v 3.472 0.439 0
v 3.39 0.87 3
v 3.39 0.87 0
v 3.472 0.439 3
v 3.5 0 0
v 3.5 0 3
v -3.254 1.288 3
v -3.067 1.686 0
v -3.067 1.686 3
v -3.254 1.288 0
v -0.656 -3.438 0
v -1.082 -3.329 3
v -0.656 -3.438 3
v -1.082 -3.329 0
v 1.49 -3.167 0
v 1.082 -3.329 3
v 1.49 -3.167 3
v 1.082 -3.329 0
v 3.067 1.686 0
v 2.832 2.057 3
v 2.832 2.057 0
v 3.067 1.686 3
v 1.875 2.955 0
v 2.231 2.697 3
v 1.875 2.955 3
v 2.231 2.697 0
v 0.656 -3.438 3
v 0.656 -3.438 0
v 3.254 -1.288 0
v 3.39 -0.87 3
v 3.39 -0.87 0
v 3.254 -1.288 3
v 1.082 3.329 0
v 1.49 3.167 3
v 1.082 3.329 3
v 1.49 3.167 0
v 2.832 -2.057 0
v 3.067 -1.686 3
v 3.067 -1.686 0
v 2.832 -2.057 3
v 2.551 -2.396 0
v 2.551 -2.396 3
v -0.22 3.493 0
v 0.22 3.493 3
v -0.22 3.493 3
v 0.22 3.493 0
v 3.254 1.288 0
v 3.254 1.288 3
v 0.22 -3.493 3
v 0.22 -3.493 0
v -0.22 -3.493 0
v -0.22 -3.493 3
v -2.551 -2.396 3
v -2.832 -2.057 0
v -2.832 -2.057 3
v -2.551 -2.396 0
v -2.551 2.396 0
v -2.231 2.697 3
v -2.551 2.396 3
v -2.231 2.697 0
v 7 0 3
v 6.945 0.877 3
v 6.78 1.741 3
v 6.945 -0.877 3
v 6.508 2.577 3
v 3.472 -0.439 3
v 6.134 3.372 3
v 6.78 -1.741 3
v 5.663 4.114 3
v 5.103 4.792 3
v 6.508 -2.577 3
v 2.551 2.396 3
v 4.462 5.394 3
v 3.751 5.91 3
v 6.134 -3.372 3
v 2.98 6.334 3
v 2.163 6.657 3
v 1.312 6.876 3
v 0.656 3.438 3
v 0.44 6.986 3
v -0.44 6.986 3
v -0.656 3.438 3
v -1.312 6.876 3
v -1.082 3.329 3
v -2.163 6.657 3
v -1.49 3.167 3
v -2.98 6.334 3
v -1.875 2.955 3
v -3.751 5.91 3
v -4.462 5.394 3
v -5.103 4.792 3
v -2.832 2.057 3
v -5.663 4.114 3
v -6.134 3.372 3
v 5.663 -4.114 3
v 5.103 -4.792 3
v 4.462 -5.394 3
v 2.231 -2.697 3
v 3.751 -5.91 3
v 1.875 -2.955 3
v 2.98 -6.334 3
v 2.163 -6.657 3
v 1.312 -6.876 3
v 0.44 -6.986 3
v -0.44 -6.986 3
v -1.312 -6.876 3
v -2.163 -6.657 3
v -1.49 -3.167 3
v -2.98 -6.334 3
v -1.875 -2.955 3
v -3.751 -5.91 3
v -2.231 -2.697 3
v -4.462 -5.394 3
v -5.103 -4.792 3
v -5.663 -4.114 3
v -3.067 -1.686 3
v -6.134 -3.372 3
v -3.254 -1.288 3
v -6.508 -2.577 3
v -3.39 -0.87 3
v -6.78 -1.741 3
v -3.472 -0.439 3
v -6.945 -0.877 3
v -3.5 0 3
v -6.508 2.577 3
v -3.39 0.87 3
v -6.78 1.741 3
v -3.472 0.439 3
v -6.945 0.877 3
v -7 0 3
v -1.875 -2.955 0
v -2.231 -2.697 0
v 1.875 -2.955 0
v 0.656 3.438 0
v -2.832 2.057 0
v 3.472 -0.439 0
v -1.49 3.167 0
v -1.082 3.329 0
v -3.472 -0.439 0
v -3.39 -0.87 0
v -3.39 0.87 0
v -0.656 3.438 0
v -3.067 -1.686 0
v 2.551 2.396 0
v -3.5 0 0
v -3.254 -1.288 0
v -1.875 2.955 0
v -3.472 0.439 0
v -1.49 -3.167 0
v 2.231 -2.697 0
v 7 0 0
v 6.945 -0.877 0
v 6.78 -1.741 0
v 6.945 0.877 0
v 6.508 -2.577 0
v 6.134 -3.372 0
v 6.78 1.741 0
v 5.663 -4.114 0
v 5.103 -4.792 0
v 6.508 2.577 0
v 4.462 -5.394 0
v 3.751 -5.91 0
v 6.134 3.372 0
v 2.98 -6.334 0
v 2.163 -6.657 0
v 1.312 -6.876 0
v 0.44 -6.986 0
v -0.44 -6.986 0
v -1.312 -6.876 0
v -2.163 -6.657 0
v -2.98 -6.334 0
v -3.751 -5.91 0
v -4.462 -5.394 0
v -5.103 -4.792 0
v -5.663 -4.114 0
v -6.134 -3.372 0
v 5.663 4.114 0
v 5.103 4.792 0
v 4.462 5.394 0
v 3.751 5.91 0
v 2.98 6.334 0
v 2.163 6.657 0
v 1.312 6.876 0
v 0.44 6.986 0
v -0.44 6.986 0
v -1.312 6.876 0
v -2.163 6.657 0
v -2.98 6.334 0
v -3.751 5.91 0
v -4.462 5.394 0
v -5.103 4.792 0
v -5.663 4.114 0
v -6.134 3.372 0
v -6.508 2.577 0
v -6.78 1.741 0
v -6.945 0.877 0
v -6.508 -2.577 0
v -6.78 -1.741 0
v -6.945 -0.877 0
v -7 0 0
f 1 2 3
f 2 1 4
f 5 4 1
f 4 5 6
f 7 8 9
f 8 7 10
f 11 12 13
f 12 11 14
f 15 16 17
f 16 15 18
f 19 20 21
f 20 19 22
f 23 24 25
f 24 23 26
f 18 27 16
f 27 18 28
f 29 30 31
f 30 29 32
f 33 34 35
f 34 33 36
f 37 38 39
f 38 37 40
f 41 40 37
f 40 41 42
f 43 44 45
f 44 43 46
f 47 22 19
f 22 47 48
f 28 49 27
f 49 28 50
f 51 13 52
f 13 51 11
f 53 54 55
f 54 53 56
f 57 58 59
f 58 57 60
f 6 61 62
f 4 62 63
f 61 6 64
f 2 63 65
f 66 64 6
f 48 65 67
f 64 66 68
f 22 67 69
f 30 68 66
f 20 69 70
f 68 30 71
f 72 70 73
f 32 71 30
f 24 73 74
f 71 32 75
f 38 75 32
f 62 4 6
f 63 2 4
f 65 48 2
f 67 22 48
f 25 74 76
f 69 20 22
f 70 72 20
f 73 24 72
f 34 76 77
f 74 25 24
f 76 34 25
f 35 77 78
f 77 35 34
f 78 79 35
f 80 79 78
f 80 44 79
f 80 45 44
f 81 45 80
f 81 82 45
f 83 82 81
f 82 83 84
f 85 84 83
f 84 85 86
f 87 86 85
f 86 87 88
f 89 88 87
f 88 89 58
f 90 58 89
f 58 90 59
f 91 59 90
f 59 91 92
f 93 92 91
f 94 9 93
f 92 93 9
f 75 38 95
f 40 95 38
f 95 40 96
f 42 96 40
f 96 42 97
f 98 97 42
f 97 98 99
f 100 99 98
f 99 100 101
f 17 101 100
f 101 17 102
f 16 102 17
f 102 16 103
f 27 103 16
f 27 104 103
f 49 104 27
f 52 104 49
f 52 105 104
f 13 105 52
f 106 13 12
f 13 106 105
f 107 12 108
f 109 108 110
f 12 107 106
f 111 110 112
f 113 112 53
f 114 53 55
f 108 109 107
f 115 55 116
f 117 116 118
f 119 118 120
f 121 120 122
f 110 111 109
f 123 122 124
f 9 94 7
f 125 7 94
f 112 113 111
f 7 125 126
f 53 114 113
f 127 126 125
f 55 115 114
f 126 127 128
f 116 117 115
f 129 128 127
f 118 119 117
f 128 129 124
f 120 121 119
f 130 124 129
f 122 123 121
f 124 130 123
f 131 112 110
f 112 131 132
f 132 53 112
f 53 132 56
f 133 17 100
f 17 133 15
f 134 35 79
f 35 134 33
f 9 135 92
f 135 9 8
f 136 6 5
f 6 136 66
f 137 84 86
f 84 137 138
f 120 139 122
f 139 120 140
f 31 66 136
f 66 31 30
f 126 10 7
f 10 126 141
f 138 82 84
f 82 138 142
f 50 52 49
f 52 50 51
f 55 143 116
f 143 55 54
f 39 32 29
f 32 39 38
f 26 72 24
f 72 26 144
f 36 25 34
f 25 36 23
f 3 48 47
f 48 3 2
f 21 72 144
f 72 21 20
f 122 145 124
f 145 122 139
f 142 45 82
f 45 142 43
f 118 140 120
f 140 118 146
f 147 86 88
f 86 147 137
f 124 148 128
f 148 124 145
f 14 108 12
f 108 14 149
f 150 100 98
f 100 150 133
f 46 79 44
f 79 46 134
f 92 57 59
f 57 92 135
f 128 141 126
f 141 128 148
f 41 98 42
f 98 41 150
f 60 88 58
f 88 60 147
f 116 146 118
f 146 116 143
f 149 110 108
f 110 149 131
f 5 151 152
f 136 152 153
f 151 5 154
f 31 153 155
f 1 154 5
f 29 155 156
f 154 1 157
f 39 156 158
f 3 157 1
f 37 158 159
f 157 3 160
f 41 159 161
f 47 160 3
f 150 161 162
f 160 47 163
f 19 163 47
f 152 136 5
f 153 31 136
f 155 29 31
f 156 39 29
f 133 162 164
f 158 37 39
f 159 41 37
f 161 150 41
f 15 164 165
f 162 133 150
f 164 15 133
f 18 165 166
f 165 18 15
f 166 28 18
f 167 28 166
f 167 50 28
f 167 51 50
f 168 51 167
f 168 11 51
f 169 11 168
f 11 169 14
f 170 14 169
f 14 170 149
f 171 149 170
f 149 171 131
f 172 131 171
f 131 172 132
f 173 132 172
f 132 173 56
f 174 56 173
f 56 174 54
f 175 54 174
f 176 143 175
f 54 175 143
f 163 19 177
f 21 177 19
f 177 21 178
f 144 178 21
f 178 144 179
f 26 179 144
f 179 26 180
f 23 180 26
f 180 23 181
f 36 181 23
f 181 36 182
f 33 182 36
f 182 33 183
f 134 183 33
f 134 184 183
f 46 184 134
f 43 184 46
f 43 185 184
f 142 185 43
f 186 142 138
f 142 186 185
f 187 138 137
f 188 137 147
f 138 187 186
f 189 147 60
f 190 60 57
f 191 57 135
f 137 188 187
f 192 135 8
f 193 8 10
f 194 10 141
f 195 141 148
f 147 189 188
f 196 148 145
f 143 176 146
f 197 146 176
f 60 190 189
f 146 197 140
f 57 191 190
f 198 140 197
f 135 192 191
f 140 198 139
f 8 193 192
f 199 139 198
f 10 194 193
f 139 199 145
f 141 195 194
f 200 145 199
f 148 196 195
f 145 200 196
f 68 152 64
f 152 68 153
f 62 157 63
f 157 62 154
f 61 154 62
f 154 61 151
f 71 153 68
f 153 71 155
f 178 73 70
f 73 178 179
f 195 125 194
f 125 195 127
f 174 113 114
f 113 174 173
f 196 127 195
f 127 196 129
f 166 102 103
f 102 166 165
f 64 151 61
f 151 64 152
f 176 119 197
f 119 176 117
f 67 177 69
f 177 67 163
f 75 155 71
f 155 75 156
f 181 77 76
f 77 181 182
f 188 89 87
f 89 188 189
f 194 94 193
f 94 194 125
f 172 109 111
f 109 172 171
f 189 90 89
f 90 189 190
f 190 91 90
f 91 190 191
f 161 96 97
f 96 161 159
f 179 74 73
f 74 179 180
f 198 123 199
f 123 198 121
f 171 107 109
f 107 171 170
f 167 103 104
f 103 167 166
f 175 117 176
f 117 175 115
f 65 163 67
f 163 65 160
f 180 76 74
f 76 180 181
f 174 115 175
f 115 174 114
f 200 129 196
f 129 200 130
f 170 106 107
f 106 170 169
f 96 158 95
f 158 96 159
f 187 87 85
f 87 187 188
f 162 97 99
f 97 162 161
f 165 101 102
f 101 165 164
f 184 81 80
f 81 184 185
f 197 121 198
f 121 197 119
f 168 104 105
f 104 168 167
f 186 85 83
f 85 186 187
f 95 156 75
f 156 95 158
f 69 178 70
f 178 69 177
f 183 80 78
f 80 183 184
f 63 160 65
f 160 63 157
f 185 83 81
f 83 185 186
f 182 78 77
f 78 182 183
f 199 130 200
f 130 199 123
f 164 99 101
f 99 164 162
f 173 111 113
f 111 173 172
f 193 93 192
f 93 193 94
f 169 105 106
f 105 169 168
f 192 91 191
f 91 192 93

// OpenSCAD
$fn = 50;

difference() {
	union() {
		cylinder(h = 3, r = 7.0);
	}
	union() {
		translate(v = [0.0, 0.0, -100.0]) {
			cylinder(h = 200, r = 3.25);
		}
		translate(v = [0.0, 0.0, -100.0]) {
			cylinder(h = 200, r = 1.8);
		}
		cylinder(h = 3, r = 3.5);
	}
}
